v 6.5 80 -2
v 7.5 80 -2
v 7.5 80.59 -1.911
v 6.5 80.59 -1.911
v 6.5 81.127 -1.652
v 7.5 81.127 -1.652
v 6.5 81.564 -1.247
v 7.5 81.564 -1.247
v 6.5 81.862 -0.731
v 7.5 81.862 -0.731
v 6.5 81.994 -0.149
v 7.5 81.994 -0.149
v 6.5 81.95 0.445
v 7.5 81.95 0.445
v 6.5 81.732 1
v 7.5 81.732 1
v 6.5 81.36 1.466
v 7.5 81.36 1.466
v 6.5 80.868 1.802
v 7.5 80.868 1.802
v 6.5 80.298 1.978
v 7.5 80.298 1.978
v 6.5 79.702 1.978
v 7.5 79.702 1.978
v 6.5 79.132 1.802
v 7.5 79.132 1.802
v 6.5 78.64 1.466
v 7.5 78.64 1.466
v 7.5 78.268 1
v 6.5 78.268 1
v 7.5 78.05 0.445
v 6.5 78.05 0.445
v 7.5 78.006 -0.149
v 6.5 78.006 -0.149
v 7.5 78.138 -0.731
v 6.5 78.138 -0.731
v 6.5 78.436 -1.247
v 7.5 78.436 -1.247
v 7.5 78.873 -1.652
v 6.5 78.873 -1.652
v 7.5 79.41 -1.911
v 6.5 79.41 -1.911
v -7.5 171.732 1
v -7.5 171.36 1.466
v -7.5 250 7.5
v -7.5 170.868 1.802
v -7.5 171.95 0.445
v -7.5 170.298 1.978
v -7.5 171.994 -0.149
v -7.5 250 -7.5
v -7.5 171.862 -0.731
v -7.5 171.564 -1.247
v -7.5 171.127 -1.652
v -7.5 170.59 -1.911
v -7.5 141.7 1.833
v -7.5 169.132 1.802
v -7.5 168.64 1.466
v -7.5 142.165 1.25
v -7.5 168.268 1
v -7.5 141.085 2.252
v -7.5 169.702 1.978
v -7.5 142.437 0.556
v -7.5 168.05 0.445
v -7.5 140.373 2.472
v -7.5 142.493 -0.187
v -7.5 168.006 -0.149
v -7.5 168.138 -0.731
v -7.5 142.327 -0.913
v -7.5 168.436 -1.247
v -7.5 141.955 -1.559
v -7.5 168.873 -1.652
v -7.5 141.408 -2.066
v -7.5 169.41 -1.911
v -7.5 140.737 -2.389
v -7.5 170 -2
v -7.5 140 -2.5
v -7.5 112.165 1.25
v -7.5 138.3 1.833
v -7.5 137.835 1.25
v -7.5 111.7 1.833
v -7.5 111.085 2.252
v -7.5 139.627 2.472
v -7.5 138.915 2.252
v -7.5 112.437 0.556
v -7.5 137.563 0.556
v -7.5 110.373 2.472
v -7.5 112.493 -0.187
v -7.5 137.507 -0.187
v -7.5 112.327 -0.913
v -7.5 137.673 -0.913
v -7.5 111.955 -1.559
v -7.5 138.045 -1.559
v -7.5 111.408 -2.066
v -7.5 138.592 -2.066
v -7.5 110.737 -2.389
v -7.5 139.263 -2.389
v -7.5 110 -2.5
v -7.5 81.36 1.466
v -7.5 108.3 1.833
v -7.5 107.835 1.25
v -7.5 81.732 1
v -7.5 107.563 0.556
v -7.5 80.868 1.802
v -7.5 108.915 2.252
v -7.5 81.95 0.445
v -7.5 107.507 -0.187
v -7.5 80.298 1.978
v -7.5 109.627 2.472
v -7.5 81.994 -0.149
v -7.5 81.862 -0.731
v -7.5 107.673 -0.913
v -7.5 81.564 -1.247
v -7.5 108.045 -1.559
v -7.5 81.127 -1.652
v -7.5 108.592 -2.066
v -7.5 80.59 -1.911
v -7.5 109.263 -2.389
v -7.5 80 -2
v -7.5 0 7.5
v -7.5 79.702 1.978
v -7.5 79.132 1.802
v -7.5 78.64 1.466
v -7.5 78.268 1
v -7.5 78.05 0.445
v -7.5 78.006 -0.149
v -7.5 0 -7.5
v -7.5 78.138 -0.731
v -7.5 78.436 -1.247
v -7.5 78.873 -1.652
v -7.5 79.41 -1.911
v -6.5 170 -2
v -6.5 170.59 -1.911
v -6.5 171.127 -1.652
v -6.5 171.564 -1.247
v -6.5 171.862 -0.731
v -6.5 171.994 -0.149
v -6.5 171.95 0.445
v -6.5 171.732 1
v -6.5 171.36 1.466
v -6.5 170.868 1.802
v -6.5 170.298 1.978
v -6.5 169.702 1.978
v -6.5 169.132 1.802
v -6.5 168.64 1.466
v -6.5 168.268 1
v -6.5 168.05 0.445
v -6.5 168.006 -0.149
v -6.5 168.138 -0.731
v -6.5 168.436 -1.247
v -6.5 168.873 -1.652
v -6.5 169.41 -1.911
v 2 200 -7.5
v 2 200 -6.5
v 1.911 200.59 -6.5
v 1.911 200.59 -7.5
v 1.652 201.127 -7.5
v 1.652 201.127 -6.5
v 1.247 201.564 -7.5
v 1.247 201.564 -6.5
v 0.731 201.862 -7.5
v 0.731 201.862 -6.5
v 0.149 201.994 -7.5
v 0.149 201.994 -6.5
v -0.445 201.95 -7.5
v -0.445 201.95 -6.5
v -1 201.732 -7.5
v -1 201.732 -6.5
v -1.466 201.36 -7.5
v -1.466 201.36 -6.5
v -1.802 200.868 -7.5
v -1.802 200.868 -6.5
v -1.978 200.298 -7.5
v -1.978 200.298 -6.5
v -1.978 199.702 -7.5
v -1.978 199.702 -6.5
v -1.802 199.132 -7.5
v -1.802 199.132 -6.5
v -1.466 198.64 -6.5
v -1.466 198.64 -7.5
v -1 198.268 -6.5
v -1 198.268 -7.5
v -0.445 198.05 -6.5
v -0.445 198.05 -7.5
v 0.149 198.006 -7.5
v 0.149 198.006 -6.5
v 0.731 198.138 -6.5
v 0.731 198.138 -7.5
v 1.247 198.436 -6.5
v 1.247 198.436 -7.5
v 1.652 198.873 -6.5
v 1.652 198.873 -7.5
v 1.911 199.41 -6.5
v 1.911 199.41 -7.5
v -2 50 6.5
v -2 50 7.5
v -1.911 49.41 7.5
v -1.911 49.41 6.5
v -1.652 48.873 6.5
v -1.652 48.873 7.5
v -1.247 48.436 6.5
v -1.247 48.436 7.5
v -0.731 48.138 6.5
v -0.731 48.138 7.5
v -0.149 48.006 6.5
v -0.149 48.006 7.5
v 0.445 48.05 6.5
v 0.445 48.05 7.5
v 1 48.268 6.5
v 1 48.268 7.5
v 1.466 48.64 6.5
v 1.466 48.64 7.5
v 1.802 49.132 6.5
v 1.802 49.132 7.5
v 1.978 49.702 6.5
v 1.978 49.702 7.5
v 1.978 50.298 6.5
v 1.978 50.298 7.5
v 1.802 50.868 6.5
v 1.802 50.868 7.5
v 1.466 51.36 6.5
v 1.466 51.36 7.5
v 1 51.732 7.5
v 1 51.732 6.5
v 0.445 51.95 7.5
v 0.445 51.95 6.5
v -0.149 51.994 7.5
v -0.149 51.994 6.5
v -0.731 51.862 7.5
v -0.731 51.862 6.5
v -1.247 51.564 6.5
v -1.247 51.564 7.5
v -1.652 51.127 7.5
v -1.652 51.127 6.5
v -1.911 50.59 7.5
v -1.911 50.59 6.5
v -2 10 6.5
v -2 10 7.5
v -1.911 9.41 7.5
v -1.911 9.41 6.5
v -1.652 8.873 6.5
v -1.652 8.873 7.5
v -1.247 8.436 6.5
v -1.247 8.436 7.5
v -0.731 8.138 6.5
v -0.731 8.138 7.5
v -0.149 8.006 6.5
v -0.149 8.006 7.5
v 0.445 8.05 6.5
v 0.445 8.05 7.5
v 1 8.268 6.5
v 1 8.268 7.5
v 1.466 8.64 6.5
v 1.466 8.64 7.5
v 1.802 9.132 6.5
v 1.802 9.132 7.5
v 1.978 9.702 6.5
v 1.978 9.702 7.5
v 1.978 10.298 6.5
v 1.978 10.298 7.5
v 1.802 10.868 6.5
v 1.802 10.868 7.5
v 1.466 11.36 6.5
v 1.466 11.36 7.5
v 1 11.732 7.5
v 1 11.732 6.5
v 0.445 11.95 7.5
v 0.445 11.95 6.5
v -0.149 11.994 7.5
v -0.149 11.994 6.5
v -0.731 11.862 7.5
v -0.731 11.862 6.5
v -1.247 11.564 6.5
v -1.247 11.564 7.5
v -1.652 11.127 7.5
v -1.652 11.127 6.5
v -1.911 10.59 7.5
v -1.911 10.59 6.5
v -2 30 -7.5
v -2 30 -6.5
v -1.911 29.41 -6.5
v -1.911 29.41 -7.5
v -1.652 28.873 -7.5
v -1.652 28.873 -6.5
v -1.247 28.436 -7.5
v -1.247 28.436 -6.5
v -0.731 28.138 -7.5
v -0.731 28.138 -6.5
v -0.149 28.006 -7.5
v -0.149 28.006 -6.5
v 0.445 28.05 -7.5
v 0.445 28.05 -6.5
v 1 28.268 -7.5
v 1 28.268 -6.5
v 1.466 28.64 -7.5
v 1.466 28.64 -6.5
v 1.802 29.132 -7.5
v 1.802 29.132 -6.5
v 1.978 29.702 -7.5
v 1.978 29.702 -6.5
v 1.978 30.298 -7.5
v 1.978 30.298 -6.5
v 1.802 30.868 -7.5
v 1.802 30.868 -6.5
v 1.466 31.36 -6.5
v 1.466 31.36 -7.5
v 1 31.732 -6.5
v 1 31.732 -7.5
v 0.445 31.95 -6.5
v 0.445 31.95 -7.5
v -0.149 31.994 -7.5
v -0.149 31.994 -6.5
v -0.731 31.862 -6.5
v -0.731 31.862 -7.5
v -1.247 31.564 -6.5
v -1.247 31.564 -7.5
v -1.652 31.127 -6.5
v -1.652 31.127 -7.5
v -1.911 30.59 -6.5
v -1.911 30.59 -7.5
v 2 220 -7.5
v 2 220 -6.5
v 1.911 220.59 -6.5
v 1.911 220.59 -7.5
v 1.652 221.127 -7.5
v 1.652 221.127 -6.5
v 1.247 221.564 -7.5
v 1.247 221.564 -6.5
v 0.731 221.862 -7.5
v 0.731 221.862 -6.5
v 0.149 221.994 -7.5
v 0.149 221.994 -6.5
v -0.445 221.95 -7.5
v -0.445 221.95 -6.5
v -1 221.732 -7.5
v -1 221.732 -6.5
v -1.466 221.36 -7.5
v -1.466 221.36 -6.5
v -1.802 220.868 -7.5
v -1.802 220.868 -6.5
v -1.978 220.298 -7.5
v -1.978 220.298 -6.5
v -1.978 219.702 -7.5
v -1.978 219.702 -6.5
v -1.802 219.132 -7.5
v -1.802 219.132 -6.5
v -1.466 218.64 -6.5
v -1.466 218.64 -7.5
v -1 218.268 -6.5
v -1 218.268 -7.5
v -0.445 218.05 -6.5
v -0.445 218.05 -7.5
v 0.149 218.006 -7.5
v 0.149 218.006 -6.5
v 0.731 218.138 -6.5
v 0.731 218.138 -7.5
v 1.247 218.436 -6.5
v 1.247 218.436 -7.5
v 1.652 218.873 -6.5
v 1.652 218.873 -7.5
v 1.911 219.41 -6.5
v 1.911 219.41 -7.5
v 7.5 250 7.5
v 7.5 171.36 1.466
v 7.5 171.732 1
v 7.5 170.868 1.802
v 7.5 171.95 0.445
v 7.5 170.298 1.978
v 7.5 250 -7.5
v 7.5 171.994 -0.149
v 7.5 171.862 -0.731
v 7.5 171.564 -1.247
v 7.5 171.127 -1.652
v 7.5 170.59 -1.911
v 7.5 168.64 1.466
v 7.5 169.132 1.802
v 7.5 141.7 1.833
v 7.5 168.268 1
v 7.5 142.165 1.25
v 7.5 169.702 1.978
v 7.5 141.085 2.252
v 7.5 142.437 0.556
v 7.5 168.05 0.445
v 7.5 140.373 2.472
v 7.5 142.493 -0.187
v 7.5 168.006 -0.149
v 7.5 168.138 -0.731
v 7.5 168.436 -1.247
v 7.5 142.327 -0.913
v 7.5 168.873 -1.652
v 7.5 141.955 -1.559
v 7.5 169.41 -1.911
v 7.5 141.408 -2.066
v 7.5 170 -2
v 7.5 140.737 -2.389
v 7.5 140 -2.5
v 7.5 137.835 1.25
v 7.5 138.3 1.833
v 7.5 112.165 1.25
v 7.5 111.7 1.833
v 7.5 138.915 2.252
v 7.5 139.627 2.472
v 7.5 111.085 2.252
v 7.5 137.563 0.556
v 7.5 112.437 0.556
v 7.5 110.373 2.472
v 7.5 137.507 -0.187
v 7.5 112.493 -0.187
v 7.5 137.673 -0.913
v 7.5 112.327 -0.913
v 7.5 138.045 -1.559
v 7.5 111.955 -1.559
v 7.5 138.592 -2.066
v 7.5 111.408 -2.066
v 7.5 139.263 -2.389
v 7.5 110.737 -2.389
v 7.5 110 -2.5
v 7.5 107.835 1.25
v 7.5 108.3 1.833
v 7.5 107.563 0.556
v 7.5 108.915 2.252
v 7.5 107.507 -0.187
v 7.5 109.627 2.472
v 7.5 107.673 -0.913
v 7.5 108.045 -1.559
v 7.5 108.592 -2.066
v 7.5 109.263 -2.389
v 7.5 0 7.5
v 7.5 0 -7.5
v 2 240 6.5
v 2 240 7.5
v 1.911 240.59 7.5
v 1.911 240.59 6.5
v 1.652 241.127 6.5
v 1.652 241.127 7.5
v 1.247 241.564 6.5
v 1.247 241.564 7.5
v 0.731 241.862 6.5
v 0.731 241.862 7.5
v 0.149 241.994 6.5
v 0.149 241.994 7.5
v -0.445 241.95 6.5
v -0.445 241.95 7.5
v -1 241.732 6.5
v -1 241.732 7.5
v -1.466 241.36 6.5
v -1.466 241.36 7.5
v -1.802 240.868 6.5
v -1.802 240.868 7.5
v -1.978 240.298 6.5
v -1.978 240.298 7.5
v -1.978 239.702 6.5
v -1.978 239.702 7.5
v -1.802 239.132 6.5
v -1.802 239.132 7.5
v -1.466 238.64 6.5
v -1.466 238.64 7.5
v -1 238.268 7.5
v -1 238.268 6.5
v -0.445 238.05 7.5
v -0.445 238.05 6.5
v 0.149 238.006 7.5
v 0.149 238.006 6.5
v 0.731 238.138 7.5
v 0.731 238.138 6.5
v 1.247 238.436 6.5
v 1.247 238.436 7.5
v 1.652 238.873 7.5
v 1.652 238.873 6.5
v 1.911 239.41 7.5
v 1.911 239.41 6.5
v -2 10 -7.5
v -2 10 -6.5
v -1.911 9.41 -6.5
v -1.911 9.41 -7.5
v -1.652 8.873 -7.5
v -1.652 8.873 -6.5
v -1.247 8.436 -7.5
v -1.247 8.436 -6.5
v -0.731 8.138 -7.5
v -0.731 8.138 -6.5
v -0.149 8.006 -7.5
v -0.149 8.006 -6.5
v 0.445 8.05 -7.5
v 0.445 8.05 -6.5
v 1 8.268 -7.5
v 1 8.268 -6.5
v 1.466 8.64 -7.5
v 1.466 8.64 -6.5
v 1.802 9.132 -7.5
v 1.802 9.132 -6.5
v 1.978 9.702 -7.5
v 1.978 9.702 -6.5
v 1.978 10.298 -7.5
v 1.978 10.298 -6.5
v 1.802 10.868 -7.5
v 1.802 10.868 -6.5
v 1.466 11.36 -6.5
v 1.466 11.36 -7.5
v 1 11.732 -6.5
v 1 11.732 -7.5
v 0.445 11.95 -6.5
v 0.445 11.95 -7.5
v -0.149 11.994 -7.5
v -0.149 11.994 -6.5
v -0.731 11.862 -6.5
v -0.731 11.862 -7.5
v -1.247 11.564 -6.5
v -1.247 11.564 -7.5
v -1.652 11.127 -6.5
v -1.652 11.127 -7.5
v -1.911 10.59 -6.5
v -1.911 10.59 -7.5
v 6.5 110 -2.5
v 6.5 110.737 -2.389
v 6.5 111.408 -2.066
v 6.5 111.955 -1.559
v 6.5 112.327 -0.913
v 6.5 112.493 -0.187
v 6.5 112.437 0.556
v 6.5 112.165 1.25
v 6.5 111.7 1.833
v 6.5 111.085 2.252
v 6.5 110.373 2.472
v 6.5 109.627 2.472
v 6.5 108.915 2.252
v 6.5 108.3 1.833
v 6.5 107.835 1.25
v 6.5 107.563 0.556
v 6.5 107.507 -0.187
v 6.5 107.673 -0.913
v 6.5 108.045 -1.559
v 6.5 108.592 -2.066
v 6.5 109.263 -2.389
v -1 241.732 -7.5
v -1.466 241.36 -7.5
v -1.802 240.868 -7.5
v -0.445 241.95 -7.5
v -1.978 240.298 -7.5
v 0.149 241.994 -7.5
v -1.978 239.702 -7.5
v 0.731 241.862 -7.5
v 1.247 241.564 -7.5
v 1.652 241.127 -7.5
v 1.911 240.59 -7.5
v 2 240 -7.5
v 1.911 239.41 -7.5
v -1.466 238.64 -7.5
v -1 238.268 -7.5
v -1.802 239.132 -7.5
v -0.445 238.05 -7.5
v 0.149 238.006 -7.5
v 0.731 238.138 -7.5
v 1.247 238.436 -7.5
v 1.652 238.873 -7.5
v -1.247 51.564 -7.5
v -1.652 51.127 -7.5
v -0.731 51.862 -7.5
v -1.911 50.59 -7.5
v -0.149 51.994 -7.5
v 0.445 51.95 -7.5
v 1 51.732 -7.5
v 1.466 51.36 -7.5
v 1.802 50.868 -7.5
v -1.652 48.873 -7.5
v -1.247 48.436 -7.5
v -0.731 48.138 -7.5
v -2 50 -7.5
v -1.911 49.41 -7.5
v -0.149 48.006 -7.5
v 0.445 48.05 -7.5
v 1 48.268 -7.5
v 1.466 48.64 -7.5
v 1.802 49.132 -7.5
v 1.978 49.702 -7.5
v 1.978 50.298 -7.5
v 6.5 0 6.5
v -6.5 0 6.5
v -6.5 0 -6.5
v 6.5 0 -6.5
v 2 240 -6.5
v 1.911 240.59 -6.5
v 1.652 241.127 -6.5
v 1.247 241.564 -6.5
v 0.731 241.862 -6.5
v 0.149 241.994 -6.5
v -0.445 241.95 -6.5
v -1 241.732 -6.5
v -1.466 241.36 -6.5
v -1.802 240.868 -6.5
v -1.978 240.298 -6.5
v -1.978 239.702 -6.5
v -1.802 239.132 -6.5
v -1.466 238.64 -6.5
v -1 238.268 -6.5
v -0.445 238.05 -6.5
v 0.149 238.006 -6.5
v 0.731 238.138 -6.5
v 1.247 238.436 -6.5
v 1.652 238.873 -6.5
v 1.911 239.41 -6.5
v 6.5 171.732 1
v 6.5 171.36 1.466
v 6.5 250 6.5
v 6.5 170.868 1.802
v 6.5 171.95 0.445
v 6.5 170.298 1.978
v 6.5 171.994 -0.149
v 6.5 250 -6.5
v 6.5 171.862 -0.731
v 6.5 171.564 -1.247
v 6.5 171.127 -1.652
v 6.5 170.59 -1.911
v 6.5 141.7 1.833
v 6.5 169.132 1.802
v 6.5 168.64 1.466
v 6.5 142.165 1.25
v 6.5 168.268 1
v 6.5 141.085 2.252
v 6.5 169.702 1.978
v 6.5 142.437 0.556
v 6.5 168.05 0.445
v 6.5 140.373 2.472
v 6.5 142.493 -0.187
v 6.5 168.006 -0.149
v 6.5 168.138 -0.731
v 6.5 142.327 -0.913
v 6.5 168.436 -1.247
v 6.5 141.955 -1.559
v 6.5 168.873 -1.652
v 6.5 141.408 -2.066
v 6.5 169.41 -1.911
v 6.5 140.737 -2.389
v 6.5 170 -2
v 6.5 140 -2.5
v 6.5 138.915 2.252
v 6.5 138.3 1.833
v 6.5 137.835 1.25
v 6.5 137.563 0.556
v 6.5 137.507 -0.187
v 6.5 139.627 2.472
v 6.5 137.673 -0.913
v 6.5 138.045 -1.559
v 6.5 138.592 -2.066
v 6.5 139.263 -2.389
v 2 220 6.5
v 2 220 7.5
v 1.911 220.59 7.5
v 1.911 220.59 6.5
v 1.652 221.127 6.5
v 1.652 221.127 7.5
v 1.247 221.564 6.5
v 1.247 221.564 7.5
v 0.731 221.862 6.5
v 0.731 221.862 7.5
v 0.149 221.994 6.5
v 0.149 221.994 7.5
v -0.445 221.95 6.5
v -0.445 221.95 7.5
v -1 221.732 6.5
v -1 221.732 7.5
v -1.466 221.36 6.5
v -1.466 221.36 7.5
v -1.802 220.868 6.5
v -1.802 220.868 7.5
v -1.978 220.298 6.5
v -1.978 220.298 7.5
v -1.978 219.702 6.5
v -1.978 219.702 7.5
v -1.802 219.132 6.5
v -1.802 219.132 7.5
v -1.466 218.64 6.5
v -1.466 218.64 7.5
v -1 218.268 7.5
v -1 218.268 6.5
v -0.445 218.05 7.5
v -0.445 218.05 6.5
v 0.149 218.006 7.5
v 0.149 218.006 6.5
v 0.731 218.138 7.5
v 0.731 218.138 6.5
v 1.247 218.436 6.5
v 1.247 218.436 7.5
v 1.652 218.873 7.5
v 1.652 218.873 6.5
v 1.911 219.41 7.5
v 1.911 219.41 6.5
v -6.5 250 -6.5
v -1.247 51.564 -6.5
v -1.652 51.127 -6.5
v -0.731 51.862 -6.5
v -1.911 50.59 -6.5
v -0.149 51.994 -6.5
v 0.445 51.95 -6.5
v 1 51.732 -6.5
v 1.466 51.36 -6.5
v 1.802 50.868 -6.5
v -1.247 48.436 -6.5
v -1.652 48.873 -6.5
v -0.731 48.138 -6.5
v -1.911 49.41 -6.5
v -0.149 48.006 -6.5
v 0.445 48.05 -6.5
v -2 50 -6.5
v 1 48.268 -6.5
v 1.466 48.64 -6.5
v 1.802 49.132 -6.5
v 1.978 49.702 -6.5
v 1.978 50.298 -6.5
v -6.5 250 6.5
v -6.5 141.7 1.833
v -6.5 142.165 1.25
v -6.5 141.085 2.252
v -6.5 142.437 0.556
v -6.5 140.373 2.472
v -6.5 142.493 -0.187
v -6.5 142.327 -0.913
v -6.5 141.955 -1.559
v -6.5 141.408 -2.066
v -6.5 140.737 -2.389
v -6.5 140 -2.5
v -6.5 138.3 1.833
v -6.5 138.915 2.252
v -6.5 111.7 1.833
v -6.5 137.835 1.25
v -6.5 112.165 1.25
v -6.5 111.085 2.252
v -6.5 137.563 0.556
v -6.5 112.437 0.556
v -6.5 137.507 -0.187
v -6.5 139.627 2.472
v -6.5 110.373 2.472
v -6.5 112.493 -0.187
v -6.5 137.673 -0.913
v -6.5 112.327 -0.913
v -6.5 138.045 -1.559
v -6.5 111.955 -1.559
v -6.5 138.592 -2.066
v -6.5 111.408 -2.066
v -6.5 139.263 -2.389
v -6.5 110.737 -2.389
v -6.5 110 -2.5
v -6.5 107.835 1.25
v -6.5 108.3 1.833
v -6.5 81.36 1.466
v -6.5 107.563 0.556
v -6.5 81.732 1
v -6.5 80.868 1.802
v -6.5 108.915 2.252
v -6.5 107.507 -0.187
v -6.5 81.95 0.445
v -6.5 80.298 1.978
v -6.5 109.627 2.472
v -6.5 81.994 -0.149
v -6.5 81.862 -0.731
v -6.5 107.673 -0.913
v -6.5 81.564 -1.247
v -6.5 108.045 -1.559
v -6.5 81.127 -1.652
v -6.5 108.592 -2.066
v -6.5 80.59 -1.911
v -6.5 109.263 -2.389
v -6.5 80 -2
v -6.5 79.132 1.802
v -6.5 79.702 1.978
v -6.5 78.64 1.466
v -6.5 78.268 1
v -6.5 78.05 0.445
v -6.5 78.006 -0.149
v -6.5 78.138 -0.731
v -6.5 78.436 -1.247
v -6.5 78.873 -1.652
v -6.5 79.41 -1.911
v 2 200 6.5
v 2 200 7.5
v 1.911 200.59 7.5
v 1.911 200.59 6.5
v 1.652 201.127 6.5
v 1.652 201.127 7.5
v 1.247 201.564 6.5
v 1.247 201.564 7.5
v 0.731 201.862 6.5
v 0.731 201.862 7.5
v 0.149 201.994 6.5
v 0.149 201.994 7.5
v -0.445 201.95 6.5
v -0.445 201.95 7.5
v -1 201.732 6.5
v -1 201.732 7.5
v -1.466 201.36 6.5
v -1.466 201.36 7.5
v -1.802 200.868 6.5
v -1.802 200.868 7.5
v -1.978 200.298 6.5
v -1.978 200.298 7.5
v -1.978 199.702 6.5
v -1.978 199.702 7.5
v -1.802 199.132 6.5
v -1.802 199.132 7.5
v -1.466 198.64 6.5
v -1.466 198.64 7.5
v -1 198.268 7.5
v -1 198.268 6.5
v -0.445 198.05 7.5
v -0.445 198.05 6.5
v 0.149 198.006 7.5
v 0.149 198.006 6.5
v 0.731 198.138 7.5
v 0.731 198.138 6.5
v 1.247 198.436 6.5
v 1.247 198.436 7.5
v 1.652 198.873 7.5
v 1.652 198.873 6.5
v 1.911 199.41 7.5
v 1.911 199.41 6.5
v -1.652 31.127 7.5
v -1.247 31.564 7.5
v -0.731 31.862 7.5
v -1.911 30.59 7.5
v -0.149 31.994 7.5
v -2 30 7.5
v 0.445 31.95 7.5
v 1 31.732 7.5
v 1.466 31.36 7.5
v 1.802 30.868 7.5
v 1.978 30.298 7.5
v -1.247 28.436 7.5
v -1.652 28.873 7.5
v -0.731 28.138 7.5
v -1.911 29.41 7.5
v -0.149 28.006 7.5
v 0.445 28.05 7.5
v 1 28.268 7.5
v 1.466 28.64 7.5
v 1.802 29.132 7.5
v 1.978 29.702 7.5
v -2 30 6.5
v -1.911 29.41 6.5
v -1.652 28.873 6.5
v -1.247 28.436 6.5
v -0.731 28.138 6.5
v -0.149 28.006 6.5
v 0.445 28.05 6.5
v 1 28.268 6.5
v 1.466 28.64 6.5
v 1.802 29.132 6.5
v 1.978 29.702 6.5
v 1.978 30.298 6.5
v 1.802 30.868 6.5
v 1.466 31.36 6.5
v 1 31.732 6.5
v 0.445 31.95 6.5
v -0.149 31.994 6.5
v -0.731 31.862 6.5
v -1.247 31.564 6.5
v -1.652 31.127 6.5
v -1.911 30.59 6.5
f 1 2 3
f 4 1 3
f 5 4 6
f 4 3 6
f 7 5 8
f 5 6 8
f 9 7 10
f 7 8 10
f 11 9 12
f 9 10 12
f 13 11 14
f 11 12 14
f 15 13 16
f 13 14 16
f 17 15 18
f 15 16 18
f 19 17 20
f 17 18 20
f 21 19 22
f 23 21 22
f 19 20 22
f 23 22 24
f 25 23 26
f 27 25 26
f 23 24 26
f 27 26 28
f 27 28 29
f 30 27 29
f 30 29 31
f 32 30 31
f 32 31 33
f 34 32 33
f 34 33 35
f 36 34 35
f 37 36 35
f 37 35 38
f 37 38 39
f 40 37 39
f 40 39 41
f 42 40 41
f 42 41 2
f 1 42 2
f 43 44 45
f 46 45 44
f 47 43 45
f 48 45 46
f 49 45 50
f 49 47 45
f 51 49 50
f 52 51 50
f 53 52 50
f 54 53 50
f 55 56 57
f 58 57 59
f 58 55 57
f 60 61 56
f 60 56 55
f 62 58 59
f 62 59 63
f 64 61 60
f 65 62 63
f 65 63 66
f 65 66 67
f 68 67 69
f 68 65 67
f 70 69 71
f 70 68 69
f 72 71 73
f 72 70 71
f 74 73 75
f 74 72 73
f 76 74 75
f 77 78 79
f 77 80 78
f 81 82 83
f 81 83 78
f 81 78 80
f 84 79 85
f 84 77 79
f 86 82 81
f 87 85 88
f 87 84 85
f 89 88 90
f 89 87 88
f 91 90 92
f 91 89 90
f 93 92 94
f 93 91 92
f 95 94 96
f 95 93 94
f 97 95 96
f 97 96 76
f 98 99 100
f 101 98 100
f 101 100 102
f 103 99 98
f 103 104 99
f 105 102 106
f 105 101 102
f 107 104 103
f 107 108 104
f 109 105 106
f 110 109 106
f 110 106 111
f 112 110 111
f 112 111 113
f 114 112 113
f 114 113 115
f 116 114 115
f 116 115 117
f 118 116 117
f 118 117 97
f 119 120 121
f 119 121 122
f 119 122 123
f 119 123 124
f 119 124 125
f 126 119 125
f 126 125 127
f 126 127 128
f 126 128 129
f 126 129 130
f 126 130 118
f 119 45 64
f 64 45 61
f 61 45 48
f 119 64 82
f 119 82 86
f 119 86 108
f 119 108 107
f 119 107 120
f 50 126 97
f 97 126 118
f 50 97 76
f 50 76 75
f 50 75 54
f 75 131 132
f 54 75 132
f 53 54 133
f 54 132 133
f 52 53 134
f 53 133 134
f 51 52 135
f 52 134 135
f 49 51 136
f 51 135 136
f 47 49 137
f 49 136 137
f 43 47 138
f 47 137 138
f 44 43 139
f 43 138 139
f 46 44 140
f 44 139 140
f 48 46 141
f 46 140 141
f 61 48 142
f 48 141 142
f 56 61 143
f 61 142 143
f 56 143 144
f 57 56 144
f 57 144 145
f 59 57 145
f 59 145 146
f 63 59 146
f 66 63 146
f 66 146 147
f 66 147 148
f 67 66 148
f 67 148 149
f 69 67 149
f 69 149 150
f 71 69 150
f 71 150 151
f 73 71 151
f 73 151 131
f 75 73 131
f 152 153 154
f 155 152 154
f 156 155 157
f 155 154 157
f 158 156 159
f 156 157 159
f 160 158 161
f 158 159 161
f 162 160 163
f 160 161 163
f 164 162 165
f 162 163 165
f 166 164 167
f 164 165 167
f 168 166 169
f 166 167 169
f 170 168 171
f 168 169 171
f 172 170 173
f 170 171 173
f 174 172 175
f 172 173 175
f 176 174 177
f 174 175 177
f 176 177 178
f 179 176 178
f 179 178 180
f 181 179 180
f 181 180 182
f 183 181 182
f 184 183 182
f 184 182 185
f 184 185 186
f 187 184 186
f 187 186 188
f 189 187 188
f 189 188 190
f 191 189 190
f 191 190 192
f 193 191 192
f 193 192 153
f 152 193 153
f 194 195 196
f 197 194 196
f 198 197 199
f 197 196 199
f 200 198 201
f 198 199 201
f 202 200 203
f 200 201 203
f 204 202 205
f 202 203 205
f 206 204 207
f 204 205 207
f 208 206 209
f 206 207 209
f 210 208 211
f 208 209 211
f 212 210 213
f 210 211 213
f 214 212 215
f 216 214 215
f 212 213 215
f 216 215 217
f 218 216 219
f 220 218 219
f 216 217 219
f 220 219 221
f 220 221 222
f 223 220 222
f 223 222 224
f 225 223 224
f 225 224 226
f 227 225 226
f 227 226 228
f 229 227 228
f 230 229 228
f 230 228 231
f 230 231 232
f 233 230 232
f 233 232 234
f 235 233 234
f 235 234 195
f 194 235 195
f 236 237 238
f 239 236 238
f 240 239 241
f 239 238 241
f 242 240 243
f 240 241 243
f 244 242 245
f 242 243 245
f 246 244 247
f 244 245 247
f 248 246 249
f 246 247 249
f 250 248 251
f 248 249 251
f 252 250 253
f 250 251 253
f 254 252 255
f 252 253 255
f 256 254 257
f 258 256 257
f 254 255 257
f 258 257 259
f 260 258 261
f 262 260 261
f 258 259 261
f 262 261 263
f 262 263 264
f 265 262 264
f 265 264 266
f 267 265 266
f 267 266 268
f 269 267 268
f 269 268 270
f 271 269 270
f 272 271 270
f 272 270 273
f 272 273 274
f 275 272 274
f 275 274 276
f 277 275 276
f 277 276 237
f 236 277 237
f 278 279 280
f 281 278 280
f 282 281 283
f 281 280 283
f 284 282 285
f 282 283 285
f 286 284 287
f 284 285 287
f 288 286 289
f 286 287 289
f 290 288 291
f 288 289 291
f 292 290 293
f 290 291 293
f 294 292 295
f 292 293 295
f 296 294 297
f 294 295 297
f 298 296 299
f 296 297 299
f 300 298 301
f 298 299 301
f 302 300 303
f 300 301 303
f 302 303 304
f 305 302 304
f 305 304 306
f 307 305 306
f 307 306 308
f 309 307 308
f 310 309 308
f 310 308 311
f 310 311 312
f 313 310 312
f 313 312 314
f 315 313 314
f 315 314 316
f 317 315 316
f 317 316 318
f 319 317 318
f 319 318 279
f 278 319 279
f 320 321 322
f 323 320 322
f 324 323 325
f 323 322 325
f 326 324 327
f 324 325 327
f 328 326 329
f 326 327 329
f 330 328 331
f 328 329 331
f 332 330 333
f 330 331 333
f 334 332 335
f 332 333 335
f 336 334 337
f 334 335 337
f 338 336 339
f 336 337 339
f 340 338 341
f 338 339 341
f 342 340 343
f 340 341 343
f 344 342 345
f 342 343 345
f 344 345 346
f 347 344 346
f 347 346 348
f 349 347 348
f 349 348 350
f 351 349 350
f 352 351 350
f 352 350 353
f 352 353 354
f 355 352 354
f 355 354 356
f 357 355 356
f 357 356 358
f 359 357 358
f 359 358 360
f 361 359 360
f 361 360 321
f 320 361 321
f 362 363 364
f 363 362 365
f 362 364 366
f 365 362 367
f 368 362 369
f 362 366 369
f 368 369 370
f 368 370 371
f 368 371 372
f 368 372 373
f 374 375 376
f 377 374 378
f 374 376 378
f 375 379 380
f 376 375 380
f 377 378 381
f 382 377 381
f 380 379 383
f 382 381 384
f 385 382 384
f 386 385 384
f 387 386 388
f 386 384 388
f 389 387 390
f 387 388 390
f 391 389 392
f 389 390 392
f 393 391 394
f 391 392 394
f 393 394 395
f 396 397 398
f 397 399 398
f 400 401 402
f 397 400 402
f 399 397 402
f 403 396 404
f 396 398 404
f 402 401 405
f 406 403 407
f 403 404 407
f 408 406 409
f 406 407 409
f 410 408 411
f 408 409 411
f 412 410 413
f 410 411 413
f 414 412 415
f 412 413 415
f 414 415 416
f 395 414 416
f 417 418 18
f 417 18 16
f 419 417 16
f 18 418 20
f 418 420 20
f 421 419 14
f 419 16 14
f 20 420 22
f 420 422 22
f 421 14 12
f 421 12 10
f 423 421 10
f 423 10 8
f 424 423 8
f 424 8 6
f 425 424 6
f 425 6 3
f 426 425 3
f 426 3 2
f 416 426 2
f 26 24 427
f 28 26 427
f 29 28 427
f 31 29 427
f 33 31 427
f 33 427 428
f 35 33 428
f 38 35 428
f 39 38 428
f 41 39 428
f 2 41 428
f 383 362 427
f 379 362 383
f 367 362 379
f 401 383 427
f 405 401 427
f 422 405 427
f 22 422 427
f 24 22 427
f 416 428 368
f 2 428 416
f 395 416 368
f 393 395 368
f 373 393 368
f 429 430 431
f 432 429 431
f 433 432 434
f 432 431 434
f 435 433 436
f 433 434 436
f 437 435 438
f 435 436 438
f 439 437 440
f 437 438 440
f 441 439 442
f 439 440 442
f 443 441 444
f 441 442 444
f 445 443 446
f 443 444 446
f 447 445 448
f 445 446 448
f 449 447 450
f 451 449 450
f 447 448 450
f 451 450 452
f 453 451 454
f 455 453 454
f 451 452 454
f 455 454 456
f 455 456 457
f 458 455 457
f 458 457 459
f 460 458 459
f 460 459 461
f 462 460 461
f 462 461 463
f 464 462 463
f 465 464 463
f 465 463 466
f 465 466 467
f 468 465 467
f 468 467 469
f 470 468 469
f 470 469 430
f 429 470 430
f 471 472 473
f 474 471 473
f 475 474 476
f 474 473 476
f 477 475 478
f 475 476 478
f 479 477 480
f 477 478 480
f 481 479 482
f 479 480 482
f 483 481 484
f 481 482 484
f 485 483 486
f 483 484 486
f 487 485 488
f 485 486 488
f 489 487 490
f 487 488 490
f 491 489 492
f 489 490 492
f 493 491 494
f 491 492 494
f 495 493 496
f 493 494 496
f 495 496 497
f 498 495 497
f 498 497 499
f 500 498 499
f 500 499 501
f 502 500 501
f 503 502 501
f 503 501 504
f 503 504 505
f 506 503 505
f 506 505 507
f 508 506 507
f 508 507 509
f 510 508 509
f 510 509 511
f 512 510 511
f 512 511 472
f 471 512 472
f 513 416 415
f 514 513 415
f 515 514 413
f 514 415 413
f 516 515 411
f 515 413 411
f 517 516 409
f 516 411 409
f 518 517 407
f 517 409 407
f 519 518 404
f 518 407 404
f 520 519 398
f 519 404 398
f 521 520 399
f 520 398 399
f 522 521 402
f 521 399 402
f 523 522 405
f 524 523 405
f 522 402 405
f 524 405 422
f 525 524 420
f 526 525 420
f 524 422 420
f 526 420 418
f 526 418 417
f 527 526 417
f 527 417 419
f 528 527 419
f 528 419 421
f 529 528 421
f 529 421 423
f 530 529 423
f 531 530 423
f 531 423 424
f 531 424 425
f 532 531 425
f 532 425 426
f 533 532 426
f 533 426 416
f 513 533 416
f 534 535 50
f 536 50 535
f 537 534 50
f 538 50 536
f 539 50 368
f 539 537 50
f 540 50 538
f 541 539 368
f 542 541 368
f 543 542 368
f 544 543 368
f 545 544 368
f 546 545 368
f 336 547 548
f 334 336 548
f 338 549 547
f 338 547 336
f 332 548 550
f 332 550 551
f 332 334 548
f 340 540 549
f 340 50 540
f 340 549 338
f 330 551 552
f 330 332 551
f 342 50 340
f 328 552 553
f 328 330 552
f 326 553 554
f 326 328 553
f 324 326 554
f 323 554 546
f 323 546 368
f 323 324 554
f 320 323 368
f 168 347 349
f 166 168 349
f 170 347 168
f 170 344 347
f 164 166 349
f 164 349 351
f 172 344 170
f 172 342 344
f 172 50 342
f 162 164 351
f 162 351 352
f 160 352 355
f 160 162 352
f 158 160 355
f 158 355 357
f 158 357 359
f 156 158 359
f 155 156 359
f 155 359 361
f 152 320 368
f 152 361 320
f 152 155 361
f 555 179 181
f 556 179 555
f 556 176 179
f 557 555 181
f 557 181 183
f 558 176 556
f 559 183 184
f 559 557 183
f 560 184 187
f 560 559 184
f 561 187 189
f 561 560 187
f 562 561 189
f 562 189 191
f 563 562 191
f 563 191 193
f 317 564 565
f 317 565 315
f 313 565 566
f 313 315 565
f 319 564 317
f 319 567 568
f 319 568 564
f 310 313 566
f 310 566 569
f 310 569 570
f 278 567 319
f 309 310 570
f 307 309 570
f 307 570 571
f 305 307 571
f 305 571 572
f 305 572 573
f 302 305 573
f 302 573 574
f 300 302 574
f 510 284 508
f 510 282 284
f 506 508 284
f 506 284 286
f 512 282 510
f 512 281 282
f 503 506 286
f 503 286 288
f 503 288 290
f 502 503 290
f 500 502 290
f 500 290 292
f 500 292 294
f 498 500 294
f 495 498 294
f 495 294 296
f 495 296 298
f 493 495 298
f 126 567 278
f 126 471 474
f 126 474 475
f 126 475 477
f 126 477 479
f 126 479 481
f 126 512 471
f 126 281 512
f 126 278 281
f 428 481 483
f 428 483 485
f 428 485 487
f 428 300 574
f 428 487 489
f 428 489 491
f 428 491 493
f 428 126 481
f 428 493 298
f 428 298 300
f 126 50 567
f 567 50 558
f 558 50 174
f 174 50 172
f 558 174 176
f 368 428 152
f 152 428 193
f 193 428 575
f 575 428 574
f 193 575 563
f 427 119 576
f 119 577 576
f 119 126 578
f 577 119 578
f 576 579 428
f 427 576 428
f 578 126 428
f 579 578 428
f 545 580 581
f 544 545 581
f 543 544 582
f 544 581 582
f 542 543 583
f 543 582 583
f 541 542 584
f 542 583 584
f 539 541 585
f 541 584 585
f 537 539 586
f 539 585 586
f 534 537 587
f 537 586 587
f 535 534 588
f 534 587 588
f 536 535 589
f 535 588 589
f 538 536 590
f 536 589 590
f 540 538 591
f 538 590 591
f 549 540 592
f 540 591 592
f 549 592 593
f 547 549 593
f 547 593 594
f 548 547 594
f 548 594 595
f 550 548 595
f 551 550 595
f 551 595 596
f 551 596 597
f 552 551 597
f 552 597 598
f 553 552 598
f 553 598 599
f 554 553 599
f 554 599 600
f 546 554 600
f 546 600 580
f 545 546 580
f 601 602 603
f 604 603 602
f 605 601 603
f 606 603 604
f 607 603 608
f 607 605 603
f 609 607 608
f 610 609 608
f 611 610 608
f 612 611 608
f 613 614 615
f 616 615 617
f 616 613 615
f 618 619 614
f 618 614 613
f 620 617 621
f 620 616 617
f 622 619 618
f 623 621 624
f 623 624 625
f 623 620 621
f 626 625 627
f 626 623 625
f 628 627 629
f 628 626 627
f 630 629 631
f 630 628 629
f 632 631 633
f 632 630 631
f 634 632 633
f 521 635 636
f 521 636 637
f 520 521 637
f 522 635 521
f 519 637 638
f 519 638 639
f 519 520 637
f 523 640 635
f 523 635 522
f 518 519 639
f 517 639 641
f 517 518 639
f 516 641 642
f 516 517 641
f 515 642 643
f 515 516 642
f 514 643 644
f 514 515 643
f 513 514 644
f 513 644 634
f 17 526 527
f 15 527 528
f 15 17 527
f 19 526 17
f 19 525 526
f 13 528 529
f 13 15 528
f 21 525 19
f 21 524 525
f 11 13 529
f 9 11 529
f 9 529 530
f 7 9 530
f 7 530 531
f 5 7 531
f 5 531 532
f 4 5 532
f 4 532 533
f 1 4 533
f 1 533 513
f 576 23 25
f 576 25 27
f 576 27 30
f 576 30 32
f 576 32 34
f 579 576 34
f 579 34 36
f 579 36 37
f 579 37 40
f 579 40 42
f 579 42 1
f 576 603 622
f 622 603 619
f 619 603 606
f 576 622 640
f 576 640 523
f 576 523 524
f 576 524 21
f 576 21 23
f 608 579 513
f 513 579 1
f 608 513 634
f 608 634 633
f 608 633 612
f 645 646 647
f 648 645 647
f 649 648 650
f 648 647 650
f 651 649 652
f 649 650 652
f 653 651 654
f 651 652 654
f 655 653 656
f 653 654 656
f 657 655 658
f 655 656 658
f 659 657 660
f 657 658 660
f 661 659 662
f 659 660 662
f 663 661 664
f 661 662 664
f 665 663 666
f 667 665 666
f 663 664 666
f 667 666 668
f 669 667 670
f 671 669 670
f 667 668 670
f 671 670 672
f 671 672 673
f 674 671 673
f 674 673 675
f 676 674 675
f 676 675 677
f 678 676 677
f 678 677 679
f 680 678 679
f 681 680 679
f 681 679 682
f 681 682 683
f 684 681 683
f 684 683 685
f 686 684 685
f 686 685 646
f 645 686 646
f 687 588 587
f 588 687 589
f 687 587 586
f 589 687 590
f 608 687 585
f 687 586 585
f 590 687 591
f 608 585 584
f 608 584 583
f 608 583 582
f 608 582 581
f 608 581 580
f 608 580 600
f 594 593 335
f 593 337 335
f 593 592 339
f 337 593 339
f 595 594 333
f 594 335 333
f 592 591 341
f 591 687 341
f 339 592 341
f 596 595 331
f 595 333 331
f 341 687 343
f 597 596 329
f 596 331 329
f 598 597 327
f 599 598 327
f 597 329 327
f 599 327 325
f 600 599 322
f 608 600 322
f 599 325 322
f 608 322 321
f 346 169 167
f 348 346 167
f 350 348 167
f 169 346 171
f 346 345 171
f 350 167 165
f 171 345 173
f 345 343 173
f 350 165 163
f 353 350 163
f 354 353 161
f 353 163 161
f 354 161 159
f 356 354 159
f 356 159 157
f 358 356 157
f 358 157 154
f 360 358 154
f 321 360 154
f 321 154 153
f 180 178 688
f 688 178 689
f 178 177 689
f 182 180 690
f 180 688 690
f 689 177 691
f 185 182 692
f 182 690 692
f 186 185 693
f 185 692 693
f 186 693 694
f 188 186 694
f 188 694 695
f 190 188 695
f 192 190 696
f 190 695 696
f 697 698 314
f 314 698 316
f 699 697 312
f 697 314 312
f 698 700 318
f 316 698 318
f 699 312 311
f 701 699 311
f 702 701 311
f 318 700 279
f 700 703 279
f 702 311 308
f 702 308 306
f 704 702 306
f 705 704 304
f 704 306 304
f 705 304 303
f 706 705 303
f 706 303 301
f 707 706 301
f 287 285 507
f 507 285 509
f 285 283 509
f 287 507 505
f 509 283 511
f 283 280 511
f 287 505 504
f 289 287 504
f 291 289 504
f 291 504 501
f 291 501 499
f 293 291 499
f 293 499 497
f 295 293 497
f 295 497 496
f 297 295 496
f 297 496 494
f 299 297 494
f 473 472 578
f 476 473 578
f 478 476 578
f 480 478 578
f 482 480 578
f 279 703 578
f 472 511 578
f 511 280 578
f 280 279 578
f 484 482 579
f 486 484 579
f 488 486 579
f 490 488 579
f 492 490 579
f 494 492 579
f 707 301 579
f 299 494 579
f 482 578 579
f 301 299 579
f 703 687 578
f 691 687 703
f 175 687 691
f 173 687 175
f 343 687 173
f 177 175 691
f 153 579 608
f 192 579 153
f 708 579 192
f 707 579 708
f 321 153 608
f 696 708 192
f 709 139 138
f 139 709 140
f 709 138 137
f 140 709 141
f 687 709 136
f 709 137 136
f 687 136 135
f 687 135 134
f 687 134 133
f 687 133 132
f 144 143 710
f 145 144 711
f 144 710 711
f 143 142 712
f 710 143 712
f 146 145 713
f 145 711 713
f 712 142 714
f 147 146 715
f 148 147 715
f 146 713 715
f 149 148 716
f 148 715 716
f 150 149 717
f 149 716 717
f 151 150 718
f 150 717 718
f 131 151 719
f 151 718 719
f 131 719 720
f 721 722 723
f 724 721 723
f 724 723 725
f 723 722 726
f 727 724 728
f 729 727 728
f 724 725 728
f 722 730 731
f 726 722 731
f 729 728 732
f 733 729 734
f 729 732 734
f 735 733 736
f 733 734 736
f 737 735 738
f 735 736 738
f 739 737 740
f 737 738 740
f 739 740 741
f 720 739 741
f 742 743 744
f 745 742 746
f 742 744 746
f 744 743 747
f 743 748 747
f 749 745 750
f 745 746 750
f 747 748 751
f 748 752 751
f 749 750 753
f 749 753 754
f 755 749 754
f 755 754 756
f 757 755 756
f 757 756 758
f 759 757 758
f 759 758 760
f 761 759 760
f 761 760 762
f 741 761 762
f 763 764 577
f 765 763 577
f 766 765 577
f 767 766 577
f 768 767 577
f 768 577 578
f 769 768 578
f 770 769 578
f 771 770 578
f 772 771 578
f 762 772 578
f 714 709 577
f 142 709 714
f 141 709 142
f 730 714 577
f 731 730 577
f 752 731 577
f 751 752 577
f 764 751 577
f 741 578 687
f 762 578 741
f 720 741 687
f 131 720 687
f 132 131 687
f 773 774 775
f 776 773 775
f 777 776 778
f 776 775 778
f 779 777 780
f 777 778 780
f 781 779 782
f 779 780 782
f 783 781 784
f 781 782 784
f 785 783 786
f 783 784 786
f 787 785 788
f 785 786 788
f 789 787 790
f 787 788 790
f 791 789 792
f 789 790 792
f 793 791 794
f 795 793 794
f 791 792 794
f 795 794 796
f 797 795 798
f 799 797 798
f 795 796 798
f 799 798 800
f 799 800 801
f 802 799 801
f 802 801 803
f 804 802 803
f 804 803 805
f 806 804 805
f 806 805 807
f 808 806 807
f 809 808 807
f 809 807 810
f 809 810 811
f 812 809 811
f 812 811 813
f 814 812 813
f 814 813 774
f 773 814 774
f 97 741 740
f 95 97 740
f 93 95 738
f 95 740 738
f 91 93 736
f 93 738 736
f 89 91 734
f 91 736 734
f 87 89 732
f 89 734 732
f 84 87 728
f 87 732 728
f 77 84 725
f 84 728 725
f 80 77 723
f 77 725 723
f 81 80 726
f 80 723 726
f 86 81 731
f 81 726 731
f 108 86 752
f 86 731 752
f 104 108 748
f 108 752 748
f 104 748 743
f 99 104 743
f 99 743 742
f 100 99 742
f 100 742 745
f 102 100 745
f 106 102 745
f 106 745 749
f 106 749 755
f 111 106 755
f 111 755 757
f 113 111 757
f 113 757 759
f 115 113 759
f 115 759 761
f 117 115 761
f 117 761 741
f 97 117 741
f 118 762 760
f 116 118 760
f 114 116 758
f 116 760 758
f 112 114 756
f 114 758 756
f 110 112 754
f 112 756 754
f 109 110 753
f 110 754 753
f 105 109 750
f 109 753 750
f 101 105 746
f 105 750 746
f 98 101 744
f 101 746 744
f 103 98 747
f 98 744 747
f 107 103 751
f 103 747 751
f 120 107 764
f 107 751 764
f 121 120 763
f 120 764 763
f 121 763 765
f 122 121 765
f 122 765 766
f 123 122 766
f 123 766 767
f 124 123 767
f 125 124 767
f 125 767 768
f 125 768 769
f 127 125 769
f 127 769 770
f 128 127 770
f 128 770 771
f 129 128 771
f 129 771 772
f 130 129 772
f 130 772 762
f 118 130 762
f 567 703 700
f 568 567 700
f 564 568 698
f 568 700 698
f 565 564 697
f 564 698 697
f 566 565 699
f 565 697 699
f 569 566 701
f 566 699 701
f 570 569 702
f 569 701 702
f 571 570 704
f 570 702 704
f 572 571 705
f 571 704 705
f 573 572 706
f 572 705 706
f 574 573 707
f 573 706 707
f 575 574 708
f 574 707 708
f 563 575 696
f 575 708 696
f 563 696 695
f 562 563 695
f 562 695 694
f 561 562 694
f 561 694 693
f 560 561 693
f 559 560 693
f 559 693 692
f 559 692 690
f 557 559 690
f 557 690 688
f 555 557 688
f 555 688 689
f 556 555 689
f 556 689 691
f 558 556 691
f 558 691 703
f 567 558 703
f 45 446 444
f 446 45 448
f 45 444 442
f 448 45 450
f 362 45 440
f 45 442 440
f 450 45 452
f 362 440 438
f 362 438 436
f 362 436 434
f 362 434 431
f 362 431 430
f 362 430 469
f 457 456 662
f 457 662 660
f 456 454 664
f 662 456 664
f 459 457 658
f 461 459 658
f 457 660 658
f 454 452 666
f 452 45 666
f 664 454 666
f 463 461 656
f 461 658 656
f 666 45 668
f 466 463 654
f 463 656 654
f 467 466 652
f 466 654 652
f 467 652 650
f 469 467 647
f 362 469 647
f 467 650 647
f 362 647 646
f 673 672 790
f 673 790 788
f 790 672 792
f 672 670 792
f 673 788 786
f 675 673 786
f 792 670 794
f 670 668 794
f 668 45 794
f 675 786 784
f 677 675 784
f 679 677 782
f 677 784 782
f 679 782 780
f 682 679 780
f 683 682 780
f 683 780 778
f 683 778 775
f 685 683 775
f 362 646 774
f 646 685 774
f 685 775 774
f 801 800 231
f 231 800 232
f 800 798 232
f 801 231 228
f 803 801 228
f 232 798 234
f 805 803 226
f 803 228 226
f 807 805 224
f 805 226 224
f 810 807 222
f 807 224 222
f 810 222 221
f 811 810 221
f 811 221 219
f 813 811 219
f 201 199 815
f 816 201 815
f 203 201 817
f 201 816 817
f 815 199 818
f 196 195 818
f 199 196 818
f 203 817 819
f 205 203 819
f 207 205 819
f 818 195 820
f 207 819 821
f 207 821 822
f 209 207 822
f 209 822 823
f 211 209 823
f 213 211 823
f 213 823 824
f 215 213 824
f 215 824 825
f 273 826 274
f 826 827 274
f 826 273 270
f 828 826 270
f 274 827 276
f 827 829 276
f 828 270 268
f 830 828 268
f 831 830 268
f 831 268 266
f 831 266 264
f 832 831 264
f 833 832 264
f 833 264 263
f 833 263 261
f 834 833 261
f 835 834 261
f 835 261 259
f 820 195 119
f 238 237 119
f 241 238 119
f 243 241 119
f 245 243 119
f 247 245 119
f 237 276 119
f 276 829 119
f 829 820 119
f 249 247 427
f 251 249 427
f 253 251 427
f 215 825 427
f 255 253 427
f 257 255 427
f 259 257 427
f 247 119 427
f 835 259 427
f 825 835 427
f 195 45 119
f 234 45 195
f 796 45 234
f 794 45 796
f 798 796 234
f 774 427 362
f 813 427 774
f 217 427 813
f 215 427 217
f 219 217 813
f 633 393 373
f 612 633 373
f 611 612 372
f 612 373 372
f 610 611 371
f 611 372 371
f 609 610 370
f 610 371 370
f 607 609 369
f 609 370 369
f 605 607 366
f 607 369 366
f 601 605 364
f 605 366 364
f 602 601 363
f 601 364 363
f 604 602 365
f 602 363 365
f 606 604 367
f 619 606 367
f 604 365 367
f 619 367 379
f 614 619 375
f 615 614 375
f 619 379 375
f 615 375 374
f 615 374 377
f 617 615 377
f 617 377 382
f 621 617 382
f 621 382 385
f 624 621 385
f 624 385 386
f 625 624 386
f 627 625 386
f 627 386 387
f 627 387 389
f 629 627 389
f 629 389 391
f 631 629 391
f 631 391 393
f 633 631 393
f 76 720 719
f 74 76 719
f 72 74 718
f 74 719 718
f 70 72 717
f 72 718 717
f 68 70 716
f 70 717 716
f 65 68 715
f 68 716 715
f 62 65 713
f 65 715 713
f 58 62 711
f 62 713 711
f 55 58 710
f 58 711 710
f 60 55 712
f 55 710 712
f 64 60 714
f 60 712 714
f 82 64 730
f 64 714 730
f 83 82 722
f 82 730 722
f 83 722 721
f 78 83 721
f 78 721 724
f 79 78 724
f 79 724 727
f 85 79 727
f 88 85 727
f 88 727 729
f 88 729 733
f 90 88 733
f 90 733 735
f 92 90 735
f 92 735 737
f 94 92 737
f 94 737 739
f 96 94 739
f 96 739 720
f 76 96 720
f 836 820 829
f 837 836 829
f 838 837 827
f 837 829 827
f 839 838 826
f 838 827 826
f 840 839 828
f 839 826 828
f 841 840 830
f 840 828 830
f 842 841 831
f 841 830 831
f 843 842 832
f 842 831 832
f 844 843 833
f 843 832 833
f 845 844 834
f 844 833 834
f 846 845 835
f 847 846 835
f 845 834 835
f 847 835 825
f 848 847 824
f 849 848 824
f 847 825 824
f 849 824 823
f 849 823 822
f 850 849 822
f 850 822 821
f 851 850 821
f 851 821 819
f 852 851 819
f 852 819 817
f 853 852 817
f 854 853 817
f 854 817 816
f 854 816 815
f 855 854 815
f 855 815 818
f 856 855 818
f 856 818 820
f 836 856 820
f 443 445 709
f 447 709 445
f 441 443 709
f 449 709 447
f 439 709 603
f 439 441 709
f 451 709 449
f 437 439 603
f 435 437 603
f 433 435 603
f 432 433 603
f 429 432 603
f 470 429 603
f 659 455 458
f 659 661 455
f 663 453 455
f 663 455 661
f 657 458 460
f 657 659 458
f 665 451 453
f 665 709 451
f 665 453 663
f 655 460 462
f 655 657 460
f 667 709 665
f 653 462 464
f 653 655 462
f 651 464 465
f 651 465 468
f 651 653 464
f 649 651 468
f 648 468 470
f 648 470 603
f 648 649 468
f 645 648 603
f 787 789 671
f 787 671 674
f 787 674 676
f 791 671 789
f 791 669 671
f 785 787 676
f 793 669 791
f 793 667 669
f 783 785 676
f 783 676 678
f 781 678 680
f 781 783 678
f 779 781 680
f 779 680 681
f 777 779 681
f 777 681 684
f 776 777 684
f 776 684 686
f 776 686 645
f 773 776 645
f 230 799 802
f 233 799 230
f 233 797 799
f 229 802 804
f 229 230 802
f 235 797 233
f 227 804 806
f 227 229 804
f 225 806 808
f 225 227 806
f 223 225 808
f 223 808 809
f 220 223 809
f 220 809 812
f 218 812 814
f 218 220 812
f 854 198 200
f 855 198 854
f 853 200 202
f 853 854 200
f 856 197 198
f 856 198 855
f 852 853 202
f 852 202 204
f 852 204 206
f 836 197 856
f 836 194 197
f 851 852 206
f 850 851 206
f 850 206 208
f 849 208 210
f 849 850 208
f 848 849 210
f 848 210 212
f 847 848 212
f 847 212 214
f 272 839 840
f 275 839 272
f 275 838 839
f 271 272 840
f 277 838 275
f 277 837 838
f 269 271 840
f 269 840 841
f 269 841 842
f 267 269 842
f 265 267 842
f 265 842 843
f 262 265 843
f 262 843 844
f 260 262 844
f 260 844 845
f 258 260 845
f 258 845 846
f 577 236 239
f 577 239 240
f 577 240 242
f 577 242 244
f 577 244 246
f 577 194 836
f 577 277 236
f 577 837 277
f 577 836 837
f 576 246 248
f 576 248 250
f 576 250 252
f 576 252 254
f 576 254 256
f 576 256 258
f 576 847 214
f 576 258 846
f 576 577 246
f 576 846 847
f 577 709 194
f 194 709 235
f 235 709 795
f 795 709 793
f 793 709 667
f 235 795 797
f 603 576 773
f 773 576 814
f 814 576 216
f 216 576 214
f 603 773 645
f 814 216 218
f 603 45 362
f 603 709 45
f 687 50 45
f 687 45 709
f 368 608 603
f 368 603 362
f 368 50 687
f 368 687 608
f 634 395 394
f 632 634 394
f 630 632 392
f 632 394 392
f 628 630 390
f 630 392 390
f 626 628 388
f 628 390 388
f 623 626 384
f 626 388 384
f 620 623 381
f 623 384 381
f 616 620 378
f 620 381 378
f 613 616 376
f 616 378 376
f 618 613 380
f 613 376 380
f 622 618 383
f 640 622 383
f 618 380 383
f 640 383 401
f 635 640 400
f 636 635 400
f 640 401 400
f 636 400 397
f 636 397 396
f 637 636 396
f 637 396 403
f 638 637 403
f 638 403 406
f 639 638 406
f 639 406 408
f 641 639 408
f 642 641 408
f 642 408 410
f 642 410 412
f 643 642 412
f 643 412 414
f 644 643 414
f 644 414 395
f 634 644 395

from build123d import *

# Parameters (mm, degrees)
SKETCH_1_W          = 15
SKETCH_1_H          = 15
SKETCH_1_W_2        = 13
SKETCH_1_H_2        = 13
EXTRUDE_1_DEPTH     = 250
SKETCH_3_R          = 2
CUT_EXTRUDE_2_DEPTH = 251.561868607
SKETCH_5_R          = 2.5
SKETCH_5_R_2        = 2
CUT_EXTRUDE_4_DEPTH = 251.561868607


with BuildPart() as part:
    # 草图1 → 凸台-拉伸1 (new body)
    with BuildSketch(Plane(origin=(0, 0, 0), x_dir=(1, 0, 0), z_dir=(0, 1, 0))):
        Rectangle(SKETCH_1_W, SKETCH_1_H)
        Rectangle(SKETCH_1_W_2, SKETCH_1_H_2, mode=Mode.SUBTRACT)
    extrude(amount=EXTRUDE_1_DEPTH)

    # 草图3 → 切除-拉伸2 (cut, through all)
    with BuildSketch(Plane.XY.offset(7.5)):
        with Locations((0, 240)):
            Circle(SKETCH_3_R)
        with Locations((0, 220)):
            Circle(SKETCH_3_R)
        with Locations(Location((0, 30, 0), (0, 0, 180))):
            Circle(SKETCH_3_R)
        with Locations(Location((0, 10, 0), (0, 0, 180))):
            Circle(SKETCH_3_R)
        with Locations((0, 200)):
            Circle(SKETCH_3_R)
        with Locations(Location((0, 50, 0), (0, 0, 180))):
            Circle(SKETCH_3_R)
    extrude(amount=-CUT_EXTRUDE_2_DEPTH, mode=Mode.SUBTRACT)

    # 草图5 → 切除-拉伸4 (cut, through all)
    with BuildSketch(Plane(origin=(7.5, 0, 0), x_dir=(0, 0, -1), z_dir=(1, 0, 0))):
        with Locations((0, 140)):
            Circle(SKETCH_5_R)
        with Locations((0, 110)):
            Circle(SKETCH_5_R)
        with Locations((0, 170)):
            Circle(SKETCH_5_R_2)
        with Locations((0, 80)):
            Circle(SKETCH_5_R_2)
    extrude(amount=-CUT_EXTRUDE_4_DEPTH, mode=Mode.SUBTRACT)


solid = part.part
